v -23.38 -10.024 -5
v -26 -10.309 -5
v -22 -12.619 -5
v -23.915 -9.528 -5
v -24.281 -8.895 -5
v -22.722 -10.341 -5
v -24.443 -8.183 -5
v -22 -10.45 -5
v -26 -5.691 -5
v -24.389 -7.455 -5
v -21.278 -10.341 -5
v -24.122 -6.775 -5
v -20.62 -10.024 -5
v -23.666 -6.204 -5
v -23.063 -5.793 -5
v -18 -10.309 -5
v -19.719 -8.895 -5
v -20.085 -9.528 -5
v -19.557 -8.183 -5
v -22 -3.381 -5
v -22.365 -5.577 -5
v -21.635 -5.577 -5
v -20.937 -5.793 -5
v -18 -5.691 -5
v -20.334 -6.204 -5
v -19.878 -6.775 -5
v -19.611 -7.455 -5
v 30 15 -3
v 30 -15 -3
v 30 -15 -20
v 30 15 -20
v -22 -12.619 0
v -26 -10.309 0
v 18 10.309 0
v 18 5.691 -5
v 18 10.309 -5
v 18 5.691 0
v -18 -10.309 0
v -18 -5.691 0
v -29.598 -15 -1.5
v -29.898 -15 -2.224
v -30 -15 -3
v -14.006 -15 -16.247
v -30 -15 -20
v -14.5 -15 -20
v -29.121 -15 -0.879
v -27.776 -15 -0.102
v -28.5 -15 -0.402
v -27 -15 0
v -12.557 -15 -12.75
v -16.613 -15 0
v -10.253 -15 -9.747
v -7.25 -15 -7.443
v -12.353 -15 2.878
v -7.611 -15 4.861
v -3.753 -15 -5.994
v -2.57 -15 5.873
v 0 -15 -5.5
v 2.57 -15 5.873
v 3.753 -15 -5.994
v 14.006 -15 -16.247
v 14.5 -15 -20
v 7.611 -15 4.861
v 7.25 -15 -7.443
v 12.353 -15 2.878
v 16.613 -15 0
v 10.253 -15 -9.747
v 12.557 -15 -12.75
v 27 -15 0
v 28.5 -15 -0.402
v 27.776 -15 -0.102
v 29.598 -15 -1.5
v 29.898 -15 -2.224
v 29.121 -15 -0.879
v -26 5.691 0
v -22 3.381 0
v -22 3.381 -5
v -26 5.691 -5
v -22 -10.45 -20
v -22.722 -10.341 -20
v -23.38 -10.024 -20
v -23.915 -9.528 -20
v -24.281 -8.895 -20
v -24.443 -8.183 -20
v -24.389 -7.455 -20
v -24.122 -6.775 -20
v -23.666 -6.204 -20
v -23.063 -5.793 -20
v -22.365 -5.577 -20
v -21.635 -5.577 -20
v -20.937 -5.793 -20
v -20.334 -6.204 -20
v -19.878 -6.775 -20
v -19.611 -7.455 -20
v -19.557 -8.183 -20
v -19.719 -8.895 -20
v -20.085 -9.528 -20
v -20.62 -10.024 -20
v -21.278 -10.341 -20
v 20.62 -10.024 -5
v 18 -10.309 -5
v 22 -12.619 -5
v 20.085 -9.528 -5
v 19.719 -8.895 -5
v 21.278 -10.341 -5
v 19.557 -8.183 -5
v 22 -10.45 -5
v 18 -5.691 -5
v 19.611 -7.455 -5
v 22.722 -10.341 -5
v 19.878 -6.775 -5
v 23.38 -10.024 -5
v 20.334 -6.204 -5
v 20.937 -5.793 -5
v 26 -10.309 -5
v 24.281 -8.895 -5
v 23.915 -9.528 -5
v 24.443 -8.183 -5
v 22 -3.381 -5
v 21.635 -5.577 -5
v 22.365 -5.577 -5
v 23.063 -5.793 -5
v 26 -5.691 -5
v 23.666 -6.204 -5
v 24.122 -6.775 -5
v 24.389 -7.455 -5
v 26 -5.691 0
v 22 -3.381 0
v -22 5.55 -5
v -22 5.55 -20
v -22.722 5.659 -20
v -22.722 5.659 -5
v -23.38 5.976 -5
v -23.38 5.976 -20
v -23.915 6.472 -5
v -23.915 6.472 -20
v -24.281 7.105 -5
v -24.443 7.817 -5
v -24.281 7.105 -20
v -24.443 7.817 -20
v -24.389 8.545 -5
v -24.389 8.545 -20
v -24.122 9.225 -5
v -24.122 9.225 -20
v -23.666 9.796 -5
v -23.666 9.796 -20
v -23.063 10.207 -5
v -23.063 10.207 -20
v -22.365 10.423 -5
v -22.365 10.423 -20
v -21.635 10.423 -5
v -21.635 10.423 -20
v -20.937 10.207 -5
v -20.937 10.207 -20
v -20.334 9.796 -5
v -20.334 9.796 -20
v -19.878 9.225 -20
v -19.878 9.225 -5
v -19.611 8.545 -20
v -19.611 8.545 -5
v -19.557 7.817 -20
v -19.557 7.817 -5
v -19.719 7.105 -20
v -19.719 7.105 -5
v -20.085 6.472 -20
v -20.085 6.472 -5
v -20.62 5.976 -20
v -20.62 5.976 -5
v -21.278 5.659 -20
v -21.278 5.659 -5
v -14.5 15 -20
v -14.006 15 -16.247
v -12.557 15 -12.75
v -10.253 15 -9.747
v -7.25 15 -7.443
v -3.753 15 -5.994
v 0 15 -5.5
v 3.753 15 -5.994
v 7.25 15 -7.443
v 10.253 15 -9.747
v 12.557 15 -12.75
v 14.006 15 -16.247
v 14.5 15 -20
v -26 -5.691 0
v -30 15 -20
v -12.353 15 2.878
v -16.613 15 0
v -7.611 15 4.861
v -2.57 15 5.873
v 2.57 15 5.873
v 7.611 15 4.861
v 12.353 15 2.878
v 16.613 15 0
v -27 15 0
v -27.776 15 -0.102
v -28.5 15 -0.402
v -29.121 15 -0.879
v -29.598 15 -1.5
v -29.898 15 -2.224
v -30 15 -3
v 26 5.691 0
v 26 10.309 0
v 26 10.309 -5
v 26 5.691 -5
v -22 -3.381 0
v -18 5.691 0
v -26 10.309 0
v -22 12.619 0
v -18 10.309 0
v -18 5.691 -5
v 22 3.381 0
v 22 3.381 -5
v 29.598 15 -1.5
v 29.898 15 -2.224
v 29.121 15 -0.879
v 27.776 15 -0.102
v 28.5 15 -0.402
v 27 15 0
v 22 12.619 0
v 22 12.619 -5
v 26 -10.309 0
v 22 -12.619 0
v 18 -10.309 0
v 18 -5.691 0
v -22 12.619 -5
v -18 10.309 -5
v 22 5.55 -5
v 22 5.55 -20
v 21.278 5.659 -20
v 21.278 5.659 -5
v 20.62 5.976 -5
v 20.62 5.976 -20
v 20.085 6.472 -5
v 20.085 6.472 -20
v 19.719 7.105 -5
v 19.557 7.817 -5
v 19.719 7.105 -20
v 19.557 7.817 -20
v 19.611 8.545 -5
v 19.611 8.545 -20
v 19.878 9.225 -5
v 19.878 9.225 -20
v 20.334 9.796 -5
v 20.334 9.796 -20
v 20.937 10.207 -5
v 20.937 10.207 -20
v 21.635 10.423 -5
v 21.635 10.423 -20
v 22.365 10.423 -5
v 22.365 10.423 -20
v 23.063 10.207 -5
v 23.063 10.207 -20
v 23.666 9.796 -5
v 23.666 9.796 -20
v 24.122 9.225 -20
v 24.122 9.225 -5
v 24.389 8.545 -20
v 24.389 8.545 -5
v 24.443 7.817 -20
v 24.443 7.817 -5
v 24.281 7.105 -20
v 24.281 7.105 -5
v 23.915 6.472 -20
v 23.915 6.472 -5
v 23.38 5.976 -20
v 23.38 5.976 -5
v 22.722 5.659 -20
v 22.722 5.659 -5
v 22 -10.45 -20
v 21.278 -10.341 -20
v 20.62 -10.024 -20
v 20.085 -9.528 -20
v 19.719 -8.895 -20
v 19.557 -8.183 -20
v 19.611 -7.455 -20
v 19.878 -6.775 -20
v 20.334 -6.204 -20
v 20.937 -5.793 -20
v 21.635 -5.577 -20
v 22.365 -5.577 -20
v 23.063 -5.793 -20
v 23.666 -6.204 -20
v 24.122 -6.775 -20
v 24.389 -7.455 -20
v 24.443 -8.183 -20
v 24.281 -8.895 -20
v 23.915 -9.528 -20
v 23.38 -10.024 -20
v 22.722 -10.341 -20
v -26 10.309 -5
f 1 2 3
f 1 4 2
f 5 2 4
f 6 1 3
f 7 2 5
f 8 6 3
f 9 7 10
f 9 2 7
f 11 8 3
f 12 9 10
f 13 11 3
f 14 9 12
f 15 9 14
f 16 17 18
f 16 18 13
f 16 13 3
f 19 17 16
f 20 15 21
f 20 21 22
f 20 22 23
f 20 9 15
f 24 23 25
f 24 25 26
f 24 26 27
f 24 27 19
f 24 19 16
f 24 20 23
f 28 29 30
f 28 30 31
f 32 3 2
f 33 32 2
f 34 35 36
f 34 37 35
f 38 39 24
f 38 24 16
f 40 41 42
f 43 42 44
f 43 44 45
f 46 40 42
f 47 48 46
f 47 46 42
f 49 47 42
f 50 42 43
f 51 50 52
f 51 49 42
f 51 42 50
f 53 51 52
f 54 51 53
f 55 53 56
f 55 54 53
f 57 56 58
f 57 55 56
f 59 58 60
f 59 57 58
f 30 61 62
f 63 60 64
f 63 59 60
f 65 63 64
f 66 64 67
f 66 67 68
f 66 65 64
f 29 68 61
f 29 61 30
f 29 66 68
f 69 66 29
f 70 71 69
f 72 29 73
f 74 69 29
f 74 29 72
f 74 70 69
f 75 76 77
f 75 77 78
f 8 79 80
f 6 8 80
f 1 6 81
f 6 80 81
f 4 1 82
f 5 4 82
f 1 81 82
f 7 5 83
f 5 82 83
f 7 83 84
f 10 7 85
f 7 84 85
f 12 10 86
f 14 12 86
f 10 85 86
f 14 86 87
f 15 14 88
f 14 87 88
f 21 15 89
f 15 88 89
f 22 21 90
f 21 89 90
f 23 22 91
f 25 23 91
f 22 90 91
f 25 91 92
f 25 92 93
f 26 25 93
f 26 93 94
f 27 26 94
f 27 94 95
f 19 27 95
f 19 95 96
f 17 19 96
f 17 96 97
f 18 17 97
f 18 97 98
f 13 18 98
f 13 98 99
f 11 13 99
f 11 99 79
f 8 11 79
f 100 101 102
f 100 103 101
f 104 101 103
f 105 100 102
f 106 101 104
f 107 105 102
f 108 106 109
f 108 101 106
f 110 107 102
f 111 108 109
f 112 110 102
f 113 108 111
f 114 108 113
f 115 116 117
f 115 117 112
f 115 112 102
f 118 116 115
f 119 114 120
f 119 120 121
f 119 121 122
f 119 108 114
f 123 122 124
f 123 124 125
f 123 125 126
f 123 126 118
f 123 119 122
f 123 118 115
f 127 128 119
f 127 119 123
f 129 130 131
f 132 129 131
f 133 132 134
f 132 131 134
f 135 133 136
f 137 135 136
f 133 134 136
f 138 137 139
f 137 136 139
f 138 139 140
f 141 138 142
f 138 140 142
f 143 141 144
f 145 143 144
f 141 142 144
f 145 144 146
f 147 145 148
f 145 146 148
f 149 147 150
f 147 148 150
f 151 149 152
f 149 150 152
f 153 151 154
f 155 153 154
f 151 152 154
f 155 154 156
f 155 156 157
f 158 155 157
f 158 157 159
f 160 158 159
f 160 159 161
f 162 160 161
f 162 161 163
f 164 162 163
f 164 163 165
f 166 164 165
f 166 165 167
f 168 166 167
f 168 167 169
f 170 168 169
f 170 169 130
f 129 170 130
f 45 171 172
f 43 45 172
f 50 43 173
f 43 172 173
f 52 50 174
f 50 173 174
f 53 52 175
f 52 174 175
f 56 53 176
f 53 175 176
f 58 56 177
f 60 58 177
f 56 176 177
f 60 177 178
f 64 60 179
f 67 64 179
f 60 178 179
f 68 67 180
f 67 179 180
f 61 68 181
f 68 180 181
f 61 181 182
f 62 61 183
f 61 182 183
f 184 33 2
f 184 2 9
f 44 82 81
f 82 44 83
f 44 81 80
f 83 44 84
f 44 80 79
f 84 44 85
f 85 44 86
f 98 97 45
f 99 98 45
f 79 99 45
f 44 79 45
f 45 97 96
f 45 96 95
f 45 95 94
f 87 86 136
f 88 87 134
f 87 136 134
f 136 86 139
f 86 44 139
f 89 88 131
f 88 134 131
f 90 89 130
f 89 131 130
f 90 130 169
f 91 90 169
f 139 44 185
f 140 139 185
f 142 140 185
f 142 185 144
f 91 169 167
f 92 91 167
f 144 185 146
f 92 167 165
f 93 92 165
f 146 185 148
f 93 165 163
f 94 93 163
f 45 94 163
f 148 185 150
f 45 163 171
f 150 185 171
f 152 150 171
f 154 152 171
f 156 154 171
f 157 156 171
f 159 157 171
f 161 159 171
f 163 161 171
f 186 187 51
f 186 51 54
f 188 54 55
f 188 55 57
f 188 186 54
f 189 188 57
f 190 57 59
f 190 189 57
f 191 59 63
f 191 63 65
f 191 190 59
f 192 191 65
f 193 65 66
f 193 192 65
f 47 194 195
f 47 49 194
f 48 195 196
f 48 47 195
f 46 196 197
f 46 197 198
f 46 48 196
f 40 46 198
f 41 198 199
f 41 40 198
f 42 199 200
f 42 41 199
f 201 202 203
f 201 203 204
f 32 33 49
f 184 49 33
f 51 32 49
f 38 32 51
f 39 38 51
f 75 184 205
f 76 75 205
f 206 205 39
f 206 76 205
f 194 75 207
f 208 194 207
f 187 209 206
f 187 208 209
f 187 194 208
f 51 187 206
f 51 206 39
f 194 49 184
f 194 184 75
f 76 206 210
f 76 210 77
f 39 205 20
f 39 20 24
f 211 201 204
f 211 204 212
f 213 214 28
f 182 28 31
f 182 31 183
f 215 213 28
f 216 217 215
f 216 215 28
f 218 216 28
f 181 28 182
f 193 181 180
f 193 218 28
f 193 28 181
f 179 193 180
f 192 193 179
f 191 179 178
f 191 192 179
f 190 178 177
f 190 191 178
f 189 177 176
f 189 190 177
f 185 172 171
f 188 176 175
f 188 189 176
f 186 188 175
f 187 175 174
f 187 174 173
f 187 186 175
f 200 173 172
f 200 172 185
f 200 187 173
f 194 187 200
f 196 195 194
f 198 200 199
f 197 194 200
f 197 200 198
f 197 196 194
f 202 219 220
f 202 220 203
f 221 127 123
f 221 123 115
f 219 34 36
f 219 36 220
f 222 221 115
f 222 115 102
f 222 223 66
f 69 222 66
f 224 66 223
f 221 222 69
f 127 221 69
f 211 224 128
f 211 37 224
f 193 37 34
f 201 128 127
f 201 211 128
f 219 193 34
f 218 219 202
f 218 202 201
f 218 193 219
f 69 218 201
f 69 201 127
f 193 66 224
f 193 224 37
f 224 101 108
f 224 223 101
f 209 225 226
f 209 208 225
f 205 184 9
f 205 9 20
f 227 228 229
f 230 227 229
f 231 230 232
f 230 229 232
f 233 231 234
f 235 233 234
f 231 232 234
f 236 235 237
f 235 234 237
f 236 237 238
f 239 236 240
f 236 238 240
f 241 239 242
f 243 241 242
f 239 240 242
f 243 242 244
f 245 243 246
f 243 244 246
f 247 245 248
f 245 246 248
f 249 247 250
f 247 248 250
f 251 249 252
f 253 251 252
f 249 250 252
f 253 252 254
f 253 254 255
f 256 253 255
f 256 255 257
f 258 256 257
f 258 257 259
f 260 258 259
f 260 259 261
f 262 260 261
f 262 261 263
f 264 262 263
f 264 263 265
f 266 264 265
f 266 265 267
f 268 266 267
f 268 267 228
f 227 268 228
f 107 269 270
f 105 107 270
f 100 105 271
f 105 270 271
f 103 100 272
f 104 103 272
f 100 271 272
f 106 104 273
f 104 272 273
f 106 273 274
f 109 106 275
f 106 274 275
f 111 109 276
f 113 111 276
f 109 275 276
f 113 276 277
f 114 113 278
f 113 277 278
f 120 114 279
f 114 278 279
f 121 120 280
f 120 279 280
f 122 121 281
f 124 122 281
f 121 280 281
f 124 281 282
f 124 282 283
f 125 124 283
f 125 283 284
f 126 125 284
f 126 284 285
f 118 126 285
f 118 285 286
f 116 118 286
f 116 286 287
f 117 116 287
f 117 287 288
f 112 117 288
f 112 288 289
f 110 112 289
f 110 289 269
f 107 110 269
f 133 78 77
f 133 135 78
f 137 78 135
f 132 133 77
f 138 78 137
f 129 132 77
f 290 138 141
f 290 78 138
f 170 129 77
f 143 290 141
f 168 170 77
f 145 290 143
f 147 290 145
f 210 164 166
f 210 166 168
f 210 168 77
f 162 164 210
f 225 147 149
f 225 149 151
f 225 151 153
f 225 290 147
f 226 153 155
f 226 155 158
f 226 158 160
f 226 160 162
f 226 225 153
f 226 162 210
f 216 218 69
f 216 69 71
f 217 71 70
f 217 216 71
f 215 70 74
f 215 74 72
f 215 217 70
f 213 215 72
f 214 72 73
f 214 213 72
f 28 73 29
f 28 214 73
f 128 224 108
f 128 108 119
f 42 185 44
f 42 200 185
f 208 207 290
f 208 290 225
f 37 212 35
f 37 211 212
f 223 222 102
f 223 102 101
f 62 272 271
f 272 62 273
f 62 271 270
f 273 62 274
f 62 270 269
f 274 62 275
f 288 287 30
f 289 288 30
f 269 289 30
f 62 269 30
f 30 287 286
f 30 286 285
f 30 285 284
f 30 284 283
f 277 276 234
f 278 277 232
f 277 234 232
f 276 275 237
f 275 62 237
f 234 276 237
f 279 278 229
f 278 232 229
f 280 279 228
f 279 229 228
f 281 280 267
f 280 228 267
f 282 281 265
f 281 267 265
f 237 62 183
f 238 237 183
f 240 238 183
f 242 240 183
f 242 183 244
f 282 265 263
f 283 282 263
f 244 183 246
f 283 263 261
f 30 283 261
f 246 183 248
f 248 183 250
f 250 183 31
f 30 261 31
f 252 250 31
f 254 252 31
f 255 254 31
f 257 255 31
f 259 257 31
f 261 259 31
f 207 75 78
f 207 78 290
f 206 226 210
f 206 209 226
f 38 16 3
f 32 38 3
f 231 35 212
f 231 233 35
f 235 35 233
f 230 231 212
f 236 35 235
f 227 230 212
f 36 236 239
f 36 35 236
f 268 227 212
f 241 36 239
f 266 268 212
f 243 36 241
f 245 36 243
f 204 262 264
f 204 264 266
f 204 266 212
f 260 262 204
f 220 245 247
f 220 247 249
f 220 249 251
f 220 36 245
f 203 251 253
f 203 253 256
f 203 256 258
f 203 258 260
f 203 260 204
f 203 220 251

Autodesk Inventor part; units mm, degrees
ref_plane "YZ Plane" through (0, 0, 0) normal (1, 0, 0) x (0, 1, 0)
ref_plane "XZ Plane" through (0, 0, 0) normal (0, 1, 0) x (-1, 0, 0)
ref_plane "XY Plane" through (0, 0, 0) normal (0, 0, 1) x (1, 0, 0)
sketch "Schizzo1" plane through (0, 0, 0) normal (0, 0, 1) x (1, 0, 0)
  line L0 (-30, -15) -> (30, -15)
  line L1 (30, -15) -> (30, 15)
  line L2 (30, 15) -> (-30, 15)
  line L3 (-30, 15) -> (-30, -15)
  line L4 (-30, -15) -> (30, 15) construction
  line L5 (30, -15) -> (-30, 15) construction
  point P0 (0, 0)
  point P1 (0, 0)
  dimension "d27" = 30
  dimension "d28" = 60
extrude "Estrusione1" add sketch "Schizzo1" against normal blind 20
sketch "Schizzo2" plane through (-25, 15, 0) normal (0, 1, 0) x (1, 0, 0)
  line L0 (55, 20) -> (-5, 20) projected
  circle A0 centre (25, 20) radius 14.5
  point P0 (25, 0)
  dimension "d60" = 29
  dimension "d61" = 20
extrude "Estrusione2" cut sketch "Schizzo2" against normal blind 30
sketch "Schizzo6" plane through (0, 0, 0) normal (0, 0, 1) x (1, 0, 0)
  line L0 (0, 15) -> (0, 8)
  line L1 (0, 8) -> (-22, 8)
  line L2 (-22, 8) -> (-22, -8)
  line L3 (0, 8) -> (22, 8)
  line L4 (0, 8) -> (22, 8) construction
  line L5 (22, 8) -> (22, -8)
  point P0 (0, 0)
  dimension "d29" = 7
  dimension "d30" = 22
  dimension "d31" = 90
  dimension "d32" = 16
  dimension "d33" = 90
  dimension "d34" = 22
  dimension "d36" = 16
  dimension "d37" = 90
hole "Foro3" at (-22, 8, 0) at (-22, -8, 0) at (22, -8, 0) at (22, 8, 0) direction (0, 0, -1) diameter 4.9 end through all clearance for "Vite a testa piana" size "M4" standard "ANSI - Profilo M Metrico"
sketch "Schizzo7" plane through (0, 0, 0) normal (0, 0, 1) x (1, 0, 0)
  line L0 (-14.5, 15) -> (14.5, 15)
  line L1 (0, 15) -> (0, 8)
  line L2 (0, 8) -> (-22, 8)
  line L3 (-22, 8) -> (-22, -8)
  line L4 (0, 8) -> (22, 8)
  line L5 (0, 8) -> (22, 8) construction
  line L6 (22, 8) -> (22, -8)
  circle A0 centre (-22, -8) radius 4
  circle A1 centre (22, 8) radius 4
  circle A2 centre (22, -8) radius 4
  circle A3 centre (-22, 8) radius 4
  line L7 (-18, 5.6906) -> (-22, 3.3812)
  line L8 (-22, 3.3812) -> (-26, 5.6906)
  line L9 (-26, 5.6906) -> (-26, 10.3094)
  line L10 (-26, 10.3094) -> (-22, 12.6188)
  line L11 (-22, 12.6188) -> (-18, 10.3094)
  line L12 (-18, 10.3094) -> (-18, 5.6906)
  line L13 (-18, -10.3094) -> (-22, -12.6188)
  line L14 (-22, -12.6188) -> (-26, -10.3094)
  line L15 (-26, -10.3094) -> (-26, -5.6906)
  line L16 (-26, -5.6906) -> (-22, -3.3812)
  line L17 (-22, -3.3812) -> (-18, -5.6906)
  line L18 (-18, -5.6906) -> (-18, -10.3094)
  line L19 (26, -10.3094) -> (22, -12.6188)
  line L20 (22, -12.6188) -> (18, -10.3094)
  line L21 (18, -10.3094) -> (18, -5.6906)
  line L22 (18, -5.6906) -> (22, -3.3812)
  line L23 (22, -3.3812) -> (26, -5.6906)
  line L24 (26, -5.6906) -> (26, -10.3094)
  line L25 (26, 5.6906) -> (22, 3.3812)
  line L26 (22, 3.3812) -> (18, 5.6906)
  line L27 (18, 5.6906) -> (18, 10.3094)
  line L28 (18, 10.3094) -> (22, 12.6188)
  line L29 (22, 12.6188) -> (26, 10.3094)
  line L30 (26, 10.3094) -> (26, 5.6906)
  point P0 (0, 0)
  point P1 (0, 0)
  point P2 (-18, 8)
  point P3 (-18, -8)
  point P4 (26, -8)
  point P5 (26, 8)
  point P6 (-24, -11.4641)
  point P7 (-20, -11.4641)
  point P8 (-26, -8)
  point P9 (-24, -4.5359)
  point P10 (-20, -4.5359)
  dimension "d54" = 8
  dimension "d55" = 8
  dimension "d56" = 8
  dimension "d69" = 8
  dimension "d45" = 7
  dimension "d46" = 22
  dimension "d47" = 90
  dimension "d48" = 16
  dimension "d49" = 90
  dimension "d50" = 22
  dimension "d51" = 16
extrude "Estrusione4" cut sketch "Schizzo7" against normal blind 5
fillet "Raccordo1" radius 3 1 edges at (30, 0, 0)
fillet "Raccordo2" radius 3 1 edges at (-30, 0, 0)
sketch "Schizzo9" plane through (0, 15, -20) normal (0, 1, 0) x (1, 0, 0)
  circle A0 centre (0, 0) radius 26
  line L0 (27, -20) -> (-27, -20) projected
  line L1 (16.6132, -20) -> (-16.6132, -20)
  point P0 (0, -20)
  dimension "d66" = 52
extrude "Estrusione5" add sketch "Schizzo9" against normal blind 30 contours L0 A0 picked at (-3.8639, -21.091)
properties part number "3_Connettore_inf_INF" material "PLA(Stampato)(D0,646)"
